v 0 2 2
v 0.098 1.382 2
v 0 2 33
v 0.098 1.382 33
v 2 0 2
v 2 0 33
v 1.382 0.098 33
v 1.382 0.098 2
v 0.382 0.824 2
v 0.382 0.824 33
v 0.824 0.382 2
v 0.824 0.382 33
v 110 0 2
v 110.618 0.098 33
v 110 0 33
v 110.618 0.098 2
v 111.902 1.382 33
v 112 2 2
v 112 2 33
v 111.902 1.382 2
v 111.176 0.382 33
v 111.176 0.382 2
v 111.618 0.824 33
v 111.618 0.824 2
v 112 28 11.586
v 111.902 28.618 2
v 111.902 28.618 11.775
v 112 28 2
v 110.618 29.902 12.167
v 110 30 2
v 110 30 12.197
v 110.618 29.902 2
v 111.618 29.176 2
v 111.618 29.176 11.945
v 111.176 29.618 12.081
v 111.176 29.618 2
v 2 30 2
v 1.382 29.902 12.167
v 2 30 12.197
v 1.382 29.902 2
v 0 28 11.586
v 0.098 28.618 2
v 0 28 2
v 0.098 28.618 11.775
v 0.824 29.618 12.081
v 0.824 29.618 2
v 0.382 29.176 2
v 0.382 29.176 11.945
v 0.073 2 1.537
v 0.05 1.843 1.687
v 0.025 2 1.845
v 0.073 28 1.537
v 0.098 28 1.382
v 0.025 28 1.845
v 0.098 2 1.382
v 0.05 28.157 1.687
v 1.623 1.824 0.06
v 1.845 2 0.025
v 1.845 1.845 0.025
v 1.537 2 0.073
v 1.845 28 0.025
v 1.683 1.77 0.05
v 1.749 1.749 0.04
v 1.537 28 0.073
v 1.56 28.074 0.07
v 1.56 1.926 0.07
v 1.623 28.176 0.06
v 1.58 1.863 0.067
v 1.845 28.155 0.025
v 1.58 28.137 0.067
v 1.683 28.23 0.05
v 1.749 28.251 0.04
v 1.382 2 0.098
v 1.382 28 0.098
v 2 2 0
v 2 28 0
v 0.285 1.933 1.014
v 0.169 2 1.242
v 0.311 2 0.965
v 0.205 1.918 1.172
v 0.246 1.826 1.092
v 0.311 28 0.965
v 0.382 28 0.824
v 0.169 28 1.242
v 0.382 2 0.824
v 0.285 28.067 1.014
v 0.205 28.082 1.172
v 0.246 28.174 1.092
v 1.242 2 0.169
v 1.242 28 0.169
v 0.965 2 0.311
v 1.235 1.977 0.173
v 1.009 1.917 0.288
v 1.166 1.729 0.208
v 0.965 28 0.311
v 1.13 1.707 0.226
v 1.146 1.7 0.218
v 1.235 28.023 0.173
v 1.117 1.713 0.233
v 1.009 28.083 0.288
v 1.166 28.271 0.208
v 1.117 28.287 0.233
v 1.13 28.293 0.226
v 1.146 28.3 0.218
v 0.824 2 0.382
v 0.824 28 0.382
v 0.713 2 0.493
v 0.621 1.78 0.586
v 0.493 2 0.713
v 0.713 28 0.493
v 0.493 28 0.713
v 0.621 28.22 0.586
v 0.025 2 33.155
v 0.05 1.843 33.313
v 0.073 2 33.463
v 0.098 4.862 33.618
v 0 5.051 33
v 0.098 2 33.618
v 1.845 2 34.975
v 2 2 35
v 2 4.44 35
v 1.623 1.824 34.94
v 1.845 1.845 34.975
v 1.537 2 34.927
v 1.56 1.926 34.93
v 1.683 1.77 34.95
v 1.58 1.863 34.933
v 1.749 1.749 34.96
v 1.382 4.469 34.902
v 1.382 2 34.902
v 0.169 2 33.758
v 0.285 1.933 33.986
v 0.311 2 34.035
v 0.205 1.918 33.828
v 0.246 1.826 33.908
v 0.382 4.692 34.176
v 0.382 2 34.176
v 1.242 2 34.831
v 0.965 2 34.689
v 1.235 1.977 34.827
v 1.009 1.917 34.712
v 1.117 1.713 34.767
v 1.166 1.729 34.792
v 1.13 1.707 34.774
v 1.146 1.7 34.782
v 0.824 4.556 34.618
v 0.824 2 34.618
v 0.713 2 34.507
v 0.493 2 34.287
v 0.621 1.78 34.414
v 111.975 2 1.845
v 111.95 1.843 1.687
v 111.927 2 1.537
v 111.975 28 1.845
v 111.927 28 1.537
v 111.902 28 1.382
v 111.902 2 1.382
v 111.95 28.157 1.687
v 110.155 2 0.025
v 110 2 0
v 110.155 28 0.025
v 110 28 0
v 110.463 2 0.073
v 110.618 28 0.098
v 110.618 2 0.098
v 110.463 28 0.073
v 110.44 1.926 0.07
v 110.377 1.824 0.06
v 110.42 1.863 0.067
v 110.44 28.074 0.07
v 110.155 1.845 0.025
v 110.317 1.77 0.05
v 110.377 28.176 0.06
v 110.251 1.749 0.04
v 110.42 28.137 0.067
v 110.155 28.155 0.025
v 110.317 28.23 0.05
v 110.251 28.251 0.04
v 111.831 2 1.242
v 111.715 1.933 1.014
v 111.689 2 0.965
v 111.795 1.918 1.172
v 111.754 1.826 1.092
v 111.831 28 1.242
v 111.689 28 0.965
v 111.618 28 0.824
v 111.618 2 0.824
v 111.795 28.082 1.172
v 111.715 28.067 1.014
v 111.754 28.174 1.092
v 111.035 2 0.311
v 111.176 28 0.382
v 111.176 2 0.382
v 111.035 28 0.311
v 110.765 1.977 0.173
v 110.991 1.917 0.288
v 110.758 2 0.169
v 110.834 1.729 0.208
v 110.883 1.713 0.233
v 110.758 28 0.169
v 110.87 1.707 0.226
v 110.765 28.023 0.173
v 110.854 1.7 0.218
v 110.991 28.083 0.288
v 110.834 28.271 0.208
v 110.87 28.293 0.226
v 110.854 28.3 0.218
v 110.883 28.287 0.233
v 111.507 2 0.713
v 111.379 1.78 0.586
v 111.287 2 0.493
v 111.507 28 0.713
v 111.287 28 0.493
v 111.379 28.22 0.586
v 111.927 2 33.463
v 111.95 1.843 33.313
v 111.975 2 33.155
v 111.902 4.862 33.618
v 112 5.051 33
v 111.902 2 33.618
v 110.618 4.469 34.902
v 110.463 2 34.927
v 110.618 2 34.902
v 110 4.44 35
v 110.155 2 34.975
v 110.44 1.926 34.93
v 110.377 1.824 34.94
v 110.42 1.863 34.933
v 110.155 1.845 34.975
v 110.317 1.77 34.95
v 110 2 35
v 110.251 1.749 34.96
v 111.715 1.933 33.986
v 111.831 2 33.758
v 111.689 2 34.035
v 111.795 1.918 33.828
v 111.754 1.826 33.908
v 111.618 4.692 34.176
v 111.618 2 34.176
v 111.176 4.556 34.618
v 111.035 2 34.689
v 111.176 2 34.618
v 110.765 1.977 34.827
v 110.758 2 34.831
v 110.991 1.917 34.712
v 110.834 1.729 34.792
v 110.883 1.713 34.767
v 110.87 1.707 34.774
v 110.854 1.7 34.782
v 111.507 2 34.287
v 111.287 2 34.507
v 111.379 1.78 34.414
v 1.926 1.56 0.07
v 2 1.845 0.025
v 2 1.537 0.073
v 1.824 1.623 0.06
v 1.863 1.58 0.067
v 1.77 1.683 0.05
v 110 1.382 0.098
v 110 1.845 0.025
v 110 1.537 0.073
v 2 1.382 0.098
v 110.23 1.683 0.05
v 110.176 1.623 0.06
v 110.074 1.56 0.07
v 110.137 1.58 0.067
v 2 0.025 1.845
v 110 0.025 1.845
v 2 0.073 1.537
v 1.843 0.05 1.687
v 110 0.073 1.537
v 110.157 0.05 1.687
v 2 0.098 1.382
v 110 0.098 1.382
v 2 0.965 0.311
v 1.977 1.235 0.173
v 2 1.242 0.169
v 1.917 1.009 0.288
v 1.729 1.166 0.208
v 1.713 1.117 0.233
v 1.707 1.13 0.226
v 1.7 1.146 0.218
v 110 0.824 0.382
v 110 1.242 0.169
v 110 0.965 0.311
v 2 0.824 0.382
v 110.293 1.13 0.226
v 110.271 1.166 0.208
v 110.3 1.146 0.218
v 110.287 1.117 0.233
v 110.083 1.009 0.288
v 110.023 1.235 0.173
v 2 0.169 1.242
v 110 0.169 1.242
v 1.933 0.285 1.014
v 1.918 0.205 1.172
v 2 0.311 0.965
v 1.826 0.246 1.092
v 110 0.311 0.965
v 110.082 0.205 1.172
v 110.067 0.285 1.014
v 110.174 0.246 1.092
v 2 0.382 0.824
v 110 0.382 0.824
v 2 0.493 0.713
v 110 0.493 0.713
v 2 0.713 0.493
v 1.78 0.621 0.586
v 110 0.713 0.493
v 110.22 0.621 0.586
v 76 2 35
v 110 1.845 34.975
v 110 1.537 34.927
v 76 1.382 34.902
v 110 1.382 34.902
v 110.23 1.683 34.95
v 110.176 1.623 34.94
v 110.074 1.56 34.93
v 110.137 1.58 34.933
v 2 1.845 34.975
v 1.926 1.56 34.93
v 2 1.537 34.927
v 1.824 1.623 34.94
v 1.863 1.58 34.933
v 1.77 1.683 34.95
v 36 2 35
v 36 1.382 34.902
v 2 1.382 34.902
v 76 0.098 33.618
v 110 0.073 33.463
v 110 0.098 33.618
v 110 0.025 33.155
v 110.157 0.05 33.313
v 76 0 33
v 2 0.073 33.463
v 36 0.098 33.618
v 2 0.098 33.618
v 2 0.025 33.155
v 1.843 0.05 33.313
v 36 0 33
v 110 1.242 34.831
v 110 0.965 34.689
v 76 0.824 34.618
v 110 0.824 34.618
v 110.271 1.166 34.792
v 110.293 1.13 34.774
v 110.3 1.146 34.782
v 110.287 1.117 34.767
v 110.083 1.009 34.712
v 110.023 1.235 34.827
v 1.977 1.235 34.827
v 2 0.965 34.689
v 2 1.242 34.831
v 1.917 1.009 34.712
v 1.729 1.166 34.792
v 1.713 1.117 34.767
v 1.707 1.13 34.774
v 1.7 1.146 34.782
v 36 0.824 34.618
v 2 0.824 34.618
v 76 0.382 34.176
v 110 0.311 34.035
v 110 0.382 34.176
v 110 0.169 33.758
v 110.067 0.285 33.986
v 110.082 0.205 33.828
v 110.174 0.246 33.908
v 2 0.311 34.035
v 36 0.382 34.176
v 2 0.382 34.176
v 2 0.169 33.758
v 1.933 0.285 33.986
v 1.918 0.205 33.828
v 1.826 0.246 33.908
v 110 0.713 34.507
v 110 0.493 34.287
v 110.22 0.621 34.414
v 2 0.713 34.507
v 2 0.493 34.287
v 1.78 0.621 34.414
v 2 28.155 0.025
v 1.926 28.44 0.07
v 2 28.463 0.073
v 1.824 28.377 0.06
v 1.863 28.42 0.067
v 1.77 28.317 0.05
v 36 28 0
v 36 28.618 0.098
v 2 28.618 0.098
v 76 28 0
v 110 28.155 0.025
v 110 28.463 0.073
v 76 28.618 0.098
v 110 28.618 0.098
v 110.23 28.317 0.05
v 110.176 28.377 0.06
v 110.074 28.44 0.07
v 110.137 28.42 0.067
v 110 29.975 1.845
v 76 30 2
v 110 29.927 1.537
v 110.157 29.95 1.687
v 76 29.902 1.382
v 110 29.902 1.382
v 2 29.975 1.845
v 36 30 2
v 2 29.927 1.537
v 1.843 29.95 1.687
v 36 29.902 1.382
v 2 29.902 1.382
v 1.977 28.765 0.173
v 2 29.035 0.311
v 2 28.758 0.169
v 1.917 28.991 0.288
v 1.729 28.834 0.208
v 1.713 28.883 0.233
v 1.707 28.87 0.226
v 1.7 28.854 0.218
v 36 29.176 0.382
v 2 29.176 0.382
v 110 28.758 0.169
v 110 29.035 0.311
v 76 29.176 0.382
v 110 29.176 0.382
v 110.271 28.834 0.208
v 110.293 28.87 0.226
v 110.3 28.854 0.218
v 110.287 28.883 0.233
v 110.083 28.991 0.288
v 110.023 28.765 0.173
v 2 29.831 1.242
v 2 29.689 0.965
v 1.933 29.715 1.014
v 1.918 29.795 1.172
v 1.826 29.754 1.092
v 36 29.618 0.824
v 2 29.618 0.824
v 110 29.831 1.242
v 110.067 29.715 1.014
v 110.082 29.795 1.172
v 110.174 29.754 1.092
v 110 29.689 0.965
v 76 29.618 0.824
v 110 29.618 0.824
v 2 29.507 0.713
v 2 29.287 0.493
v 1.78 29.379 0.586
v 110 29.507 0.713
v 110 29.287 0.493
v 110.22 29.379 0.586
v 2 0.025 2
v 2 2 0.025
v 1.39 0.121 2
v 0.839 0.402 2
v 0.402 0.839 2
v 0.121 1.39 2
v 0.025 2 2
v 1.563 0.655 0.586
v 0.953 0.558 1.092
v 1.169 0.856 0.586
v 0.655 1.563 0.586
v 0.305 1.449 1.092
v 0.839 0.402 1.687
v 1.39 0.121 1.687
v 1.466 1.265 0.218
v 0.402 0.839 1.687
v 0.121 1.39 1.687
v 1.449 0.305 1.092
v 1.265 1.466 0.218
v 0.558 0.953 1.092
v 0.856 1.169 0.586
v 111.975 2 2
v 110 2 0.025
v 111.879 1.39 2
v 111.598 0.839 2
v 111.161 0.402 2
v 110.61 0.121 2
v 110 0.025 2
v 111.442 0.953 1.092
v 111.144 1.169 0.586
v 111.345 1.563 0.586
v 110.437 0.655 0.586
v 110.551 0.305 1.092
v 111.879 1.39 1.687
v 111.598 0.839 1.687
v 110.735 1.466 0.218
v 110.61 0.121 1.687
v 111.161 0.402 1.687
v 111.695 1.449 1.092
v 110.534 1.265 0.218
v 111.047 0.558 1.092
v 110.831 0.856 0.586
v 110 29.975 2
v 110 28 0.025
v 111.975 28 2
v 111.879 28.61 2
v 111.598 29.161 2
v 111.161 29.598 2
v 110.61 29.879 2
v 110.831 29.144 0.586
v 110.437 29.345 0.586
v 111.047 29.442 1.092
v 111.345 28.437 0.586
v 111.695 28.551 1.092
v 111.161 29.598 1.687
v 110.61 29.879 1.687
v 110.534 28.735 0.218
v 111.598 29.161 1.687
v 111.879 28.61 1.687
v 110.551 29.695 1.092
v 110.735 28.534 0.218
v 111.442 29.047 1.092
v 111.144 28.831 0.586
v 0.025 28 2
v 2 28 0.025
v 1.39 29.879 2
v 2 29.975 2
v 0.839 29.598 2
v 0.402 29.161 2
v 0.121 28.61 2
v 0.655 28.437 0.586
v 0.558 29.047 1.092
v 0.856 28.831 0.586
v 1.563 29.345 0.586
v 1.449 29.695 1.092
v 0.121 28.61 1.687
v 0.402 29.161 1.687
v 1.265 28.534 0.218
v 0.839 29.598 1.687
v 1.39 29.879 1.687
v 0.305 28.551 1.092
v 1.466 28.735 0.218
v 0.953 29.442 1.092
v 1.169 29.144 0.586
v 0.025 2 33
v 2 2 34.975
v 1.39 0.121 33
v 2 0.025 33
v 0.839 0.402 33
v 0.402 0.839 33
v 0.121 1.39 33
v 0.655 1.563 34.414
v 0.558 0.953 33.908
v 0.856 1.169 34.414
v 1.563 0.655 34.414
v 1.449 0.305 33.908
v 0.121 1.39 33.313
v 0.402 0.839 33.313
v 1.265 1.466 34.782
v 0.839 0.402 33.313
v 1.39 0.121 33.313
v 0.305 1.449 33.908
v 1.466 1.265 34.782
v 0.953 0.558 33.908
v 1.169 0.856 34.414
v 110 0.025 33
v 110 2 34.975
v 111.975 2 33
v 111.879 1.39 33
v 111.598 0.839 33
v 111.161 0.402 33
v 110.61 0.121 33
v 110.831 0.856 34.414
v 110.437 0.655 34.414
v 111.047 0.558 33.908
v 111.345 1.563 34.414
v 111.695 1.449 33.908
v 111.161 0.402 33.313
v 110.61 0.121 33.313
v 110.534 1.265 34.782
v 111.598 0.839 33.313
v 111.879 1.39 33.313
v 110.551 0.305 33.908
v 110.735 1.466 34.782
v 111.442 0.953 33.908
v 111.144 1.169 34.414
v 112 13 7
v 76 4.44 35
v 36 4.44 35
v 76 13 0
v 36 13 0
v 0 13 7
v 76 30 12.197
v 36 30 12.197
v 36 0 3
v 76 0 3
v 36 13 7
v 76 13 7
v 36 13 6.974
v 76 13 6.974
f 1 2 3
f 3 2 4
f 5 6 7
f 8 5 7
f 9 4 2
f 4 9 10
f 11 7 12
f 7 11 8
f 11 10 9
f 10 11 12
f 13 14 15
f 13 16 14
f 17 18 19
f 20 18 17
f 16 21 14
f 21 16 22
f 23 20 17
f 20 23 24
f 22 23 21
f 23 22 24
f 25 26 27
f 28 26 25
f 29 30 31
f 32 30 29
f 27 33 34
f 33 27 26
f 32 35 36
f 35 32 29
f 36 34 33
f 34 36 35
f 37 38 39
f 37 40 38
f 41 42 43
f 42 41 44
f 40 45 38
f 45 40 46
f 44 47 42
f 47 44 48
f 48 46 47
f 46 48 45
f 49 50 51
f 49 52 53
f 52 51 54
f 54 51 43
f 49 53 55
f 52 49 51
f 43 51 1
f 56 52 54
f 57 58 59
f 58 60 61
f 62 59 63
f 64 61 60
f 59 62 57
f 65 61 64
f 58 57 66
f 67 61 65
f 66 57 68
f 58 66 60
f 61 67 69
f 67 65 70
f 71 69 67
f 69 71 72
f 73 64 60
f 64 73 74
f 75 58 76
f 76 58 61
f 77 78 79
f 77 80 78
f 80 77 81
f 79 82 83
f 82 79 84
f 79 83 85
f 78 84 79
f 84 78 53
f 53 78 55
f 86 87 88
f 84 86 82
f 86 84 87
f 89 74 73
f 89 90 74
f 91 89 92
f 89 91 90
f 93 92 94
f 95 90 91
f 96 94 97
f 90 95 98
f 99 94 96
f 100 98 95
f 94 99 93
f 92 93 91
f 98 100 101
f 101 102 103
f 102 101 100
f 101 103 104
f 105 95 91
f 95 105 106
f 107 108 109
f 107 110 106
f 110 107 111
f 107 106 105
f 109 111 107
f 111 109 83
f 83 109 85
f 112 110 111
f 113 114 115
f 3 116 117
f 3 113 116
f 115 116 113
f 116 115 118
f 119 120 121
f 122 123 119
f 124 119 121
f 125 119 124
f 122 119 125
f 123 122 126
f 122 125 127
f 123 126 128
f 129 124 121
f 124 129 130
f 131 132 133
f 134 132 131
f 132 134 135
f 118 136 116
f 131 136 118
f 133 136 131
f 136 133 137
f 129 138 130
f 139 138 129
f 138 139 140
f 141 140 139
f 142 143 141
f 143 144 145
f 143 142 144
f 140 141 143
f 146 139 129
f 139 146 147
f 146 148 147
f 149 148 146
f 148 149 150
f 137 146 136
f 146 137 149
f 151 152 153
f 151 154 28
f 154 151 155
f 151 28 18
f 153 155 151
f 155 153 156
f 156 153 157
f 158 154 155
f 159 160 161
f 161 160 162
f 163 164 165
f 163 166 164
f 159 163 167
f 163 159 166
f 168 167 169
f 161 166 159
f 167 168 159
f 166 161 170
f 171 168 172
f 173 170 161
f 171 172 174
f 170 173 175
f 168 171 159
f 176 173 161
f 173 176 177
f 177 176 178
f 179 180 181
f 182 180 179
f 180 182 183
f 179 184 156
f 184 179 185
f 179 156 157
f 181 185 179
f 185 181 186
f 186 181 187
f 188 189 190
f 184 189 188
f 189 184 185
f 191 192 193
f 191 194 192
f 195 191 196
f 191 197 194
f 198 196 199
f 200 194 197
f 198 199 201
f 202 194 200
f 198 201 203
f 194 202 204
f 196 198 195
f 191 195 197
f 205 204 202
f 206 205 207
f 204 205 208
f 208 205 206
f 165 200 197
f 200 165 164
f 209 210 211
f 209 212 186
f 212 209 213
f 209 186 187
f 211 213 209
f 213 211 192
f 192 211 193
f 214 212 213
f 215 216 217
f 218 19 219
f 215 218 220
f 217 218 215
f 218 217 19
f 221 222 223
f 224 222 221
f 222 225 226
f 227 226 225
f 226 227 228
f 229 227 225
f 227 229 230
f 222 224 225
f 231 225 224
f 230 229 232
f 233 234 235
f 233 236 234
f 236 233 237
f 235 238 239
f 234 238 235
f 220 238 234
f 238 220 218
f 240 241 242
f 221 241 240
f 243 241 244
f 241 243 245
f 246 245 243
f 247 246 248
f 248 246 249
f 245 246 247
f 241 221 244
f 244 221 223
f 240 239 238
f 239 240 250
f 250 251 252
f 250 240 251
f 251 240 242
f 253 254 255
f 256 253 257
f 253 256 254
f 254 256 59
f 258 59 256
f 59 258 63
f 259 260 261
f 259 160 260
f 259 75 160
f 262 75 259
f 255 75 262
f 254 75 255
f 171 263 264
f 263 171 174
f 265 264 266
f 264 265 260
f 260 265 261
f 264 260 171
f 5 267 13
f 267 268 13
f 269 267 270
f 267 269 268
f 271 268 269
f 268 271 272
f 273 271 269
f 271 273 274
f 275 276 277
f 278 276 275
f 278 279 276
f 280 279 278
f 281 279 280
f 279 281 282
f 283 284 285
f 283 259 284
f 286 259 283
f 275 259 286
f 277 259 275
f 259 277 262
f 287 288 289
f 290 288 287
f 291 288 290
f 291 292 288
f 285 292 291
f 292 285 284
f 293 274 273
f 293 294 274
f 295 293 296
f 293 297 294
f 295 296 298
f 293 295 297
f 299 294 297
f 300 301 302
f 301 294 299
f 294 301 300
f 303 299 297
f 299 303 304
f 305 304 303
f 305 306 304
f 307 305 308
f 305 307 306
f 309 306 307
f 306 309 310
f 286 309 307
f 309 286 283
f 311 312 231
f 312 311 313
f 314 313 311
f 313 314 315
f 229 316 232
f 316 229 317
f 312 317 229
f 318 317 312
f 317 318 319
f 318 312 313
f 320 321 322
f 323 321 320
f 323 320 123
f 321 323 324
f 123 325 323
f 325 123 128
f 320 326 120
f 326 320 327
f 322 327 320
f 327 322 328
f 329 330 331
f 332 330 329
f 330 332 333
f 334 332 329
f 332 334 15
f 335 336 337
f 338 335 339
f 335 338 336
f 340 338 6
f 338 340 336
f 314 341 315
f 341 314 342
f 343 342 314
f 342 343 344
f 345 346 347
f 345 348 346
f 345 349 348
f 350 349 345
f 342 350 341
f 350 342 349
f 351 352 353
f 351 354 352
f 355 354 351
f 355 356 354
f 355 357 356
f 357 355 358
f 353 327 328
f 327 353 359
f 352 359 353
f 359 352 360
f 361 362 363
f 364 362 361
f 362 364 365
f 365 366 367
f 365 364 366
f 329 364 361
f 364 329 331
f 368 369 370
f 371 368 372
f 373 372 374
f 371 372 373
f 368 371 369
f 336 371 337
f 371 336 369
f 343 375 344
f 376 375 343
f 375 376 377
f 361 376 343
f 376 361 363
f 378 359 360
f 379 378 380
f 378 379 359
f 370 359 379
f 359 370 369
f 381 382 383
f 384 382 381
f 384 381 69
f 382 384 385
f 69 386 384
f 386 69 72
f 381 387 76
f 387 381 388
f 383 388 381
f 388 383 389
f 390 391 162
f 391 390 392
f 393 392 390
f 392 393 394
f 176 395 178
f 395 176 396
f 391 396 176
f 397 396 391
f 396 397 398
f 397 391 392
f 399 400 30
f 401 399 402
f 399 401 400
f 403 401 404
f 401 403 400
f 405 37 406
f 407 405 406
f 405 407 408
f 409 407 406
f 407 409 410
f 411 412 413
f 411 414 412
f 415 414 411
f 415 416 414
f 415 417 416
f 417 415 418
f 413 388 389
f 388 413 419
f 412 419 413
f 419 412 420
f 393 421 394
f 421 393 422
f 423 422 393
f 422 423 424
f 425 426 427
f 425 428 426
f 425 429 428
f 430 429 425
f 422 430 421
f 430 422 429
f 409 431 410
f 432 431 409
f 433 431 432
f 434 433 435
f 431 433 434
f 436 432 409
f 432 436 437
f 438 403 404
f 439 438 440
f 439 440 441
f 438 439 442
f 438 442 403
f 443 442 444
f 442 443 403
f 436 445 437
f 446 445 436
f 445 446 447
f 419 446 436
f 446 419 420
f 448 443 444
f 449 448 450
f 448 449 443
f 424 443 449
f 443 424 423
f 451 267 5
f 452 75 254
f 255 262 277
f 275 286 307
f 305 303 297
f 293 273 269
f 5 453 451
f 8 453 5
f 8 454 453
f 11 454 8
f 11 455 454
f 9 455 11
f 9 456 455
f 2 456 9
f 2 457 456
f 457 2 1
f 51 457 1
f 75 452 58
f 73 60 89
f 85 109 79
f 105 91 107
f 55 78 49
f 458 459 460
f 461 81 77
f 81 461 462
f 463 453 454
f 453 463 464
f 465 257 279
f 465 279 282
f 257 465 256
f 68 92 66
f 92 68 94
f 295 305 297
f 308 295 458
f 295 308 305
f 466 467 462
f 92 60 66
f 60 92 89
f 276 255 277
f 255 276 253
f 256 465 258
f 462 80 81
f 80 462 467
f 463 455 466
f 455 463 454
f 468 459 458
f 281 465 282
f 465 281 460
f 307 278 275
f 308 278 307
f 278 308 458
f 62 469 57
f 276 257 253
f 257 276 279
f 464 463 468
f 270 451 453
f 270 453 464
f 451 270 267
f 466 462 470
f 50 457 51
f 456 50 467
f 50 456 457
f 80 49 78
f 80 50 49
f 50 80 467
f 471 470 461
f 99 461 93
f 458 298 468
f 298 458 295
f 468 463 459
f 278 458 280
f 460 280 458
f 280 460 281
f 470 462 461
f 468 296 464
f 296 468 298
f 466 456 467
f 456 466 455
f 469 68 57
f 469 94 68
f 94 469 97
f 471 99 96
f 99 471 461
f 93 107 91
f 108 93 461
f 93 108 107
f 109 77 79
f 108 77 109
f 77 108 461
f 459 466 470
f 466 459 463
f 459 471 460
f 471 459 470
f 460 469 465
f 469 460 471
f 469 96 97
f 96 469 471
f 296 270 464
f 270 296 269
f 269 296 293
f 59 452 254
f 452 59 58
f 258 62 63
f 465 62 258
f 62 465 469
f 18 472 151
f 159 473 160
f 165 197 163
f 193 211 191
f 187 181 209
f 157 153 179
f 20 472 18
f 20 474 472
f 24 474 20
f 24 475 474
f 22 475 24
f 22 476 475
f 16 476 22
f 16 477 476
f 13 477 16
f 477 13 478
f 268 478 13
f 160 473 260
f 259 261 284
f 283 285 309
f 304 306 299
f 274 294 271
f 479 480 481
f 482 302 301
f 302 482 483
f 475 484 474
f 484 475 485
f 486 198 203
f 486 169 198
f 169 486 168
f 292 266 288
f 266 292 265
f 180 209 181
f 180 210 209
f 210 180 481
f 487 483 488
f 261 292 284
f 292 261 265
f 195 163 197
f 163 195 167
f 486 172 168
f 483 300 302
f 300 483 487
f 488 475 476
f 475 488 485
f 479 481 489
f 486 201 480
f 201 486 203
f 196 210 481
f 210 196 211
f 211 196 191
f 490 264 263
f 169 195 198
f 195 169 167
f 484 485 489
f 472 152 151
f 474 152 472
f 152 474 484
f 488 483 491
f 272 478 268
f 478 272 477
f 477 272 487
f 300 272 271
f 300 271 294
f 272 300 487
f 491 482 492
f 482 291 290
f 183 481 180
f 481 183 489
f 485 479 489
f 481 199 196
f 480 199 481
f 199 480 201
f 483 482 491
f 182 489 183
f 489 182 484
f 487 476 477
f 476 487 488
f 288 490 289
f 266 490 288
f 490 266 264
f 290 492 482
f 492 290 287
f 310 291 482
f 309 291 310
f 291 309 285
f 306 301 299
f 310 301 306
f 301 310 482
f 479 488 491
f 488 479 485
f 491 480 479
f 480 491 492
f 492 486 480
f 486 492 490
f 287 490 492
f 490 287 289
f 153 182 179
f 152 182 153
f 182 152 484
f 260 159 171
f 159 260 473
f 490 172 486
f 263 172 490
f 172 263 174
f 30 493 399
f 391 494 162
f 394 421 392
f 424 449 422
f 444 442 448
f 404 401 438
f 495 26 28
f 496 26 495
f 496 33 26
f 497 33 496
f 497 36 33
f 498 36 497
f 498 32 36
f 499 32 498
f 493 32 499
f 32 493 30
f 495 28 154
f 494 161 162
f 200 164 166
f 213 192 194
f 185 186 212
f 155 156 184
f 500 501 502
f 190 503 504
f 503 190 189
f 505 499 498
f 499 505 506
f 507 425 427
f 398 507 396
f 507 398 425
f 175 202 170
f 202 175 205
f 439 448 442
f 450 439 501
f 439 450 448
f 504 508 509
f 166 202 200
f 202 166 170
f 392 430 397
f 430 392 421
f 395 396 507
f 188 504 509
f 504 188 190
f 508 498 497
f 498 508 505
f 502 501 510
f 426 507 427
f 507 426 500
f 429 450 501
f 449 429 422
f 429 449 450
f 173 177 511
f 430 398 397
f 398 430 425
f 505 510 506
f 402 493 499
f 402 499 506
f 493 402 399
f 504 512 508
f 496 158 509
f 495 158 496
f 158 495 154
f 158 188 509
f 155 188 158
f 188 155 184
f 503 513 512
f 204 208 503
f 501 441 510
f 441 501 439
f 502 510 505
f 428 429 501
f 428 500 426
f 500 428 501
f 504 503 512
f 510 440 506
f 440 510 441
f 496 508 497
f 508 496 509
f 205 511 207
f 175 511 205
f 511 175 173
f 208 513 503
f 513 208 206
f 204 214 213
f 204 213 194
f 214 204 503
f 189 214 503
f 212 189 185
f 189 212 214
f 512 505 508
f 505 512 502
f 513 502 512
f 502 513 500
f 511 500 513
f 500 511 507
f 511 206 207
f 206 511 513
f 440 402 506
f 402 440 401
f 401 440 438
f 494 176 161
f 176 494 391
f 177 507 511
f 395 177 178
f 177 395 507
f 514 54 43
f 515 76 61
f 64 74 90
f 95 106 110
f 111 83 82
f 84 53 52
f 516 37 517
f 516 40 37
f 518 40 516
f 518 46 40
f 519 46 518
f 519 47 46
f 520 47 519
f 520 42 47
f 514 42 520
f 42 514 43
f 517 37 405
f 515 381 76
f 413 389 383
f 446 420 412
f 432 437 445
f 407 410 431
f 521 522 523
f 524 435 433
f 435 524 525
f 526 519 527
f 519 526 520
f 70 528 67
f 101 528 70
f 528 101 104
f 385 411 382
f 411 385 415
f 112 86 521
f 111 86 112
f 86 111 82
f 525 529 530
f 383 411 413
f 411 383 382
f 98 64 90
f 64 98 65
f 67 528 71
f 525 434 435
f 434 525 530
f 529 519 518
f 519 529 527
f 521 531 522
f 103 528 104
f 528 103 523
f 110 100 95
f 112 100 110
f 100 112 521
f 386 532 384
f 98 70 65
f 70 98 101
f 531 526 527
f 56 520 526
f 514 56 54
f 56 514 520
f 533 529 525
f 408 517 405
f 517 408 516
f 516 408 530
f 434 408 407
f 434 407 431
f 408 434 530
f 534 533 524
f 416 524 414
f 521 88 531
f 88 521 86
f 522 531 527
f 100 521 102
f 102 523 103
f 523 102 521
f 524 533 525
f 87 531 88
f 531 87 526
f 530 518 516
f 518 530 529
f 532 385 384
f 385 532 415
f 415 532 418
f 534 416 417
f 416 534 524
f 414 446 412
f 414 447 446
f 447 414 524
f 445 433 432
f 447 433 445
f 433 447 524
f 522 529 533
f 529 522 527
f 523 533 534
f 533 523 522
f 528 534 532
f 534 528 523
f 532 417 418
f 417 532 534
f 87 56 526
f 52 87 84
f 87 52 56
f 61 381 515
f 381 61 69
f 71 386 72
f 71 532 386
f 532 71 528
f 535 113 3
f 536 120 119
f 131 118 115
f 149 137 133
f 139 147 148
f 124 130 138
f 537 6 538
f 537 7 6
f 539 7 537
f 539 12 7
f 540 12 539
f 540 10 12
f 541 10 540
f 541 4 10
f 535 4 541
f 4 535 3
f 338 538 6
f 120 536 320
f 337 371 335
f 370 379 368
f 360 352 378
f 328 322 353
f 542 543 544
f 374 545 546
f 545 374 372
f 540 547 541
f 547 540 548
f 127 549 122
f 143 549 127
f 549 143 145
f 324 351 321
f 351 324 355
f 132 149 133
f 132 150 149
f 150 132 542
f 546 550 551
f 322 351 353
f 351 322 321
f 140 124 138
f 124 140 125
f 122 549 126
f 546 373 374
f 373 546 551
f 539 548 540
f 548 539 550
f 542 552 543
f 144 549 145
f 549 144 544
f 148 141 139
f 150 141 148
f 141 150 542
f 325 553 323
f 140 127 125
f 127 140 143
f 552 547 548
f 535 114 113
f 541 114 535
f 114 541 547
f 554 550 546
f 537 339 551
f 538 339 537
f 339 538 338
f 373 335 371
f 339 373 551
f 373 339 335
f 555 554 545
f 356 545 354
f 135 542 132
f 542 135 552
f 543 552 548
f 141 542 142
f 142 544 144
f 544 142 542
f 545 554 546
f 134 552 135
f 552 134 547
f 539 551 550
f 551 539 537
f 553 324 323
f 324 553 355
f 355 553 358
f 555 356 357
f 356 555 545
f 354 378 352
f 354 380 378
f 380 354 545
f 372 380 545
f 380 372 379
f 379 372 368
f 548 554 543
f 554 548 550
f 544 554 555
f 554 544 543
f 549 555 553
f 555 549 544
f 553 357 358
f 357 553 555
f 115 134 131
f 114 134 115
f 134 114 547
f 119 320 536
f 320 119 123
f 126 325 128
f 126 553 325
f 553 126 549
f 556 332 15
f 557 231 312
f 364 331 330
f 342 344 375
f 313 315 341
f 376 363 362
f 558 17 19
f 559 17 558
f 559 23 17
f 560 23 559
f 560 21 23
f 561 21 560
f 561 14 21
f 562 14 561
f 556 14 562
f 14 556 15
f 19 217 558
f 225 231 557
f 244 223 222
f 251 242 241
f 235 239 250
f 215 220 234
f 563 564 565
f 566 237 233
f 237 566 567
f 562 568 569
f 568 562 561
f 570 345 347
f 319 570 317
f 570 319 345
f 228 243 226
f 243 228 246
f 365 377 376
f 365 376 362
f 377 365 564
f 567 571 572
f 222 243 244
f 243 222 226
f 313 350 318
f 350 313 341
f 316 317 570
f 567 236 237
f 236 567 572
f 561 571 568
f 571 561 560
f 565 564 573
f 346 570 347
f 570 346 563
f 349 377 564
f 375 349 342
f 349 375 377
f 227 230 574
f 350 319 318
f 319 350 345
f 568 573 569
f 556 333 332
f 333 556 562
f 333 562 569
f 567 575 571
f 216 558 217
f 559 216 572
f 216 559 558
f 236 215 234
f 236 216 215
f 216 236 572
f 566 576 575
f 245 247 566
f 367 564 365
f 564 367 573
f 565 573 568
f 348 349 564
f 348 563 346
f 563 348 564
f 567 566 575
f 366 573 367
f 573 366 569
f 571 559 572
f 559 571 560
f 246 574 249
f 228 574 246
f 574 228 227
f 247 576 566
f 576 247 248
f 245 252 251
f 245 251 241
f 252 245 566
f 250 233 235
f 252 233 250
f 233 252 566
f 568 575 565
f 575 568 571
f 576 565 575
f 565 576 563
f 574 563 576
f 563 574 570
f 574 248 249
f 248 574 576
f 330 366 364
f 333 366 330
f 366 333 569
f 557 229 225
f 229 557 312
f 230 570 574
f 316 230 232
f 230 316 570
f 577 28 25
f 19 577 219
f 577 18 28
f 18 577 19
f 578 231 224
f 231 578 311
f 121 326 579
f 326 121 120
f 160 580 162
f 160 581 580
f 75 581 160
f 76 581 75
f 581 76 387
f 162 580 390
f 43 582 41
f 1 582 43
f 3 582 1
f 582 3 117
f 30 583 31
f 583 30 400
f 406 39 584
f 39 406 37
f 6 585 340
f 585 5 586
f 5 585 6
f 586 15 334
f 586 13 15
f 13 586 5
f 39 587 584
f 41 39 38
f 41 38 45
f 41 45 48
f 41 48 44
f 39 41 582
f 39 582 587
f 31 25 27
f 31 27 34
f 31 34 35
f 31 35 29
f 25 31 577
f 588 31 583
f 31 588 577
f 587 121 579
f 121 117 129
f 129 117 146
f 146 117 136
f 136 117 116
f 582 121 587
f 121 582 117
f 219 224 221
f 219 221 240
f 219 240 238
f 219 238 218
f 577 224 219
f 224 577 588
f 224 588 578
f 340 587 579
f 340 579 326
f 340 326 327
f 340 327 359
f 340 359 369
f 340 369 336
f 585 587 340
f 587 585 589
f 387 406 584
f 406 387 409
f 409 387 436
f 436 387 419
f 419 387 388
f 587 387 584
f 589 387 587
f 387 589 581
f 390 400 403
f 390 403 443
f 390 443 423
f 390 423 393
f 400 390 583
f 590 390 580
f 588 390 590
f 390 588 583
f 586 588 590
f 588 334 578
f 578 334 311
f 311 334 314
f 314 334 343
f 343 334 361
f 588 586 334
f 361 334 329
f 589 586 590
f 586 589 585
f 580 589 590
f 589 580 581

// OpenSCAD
// Cube with rounded edges

el = 1e-2;

module rcube_rcorner ( r, fn )
{
   difference() {
      translate ( -el * [ 1, 1, 1 ] ) cube( r + el );
      translate ( [ r, r, r ] ) sphere( r, $fn = fn );
   }
}

module rcube_redge ( r, l, fn )
{
   difference() {
      translate ( -2 * el * [ 1, 1, 1 ] ) cube( [ r + 2 * el, r + 2 * el, l + 4 * el ] );
      translate ( [ r, r, -el ] ) cylinder( r = r, h = l + 2 * el, $fn = fn );
   }
}

module rcube( size = 1, center = false, r = 0, $fn = 20 )
{
        sz = len( size ) == undef ? [ size, size, size ] : size;
        displacement = center == true ? -size / 2: [ 0, 0, 0 ];

        translate( displacement ) {
                difference() {
                        cube( size = sz );
                        union (){
                                // Round the edges:

                                rcube_redge( r, sz[2], fn = $fn );
                                translate( [ sz[0], 0, 0 ] ) rotate( 90, [ 0, 0, 1 ] ) rcube_redge( r, sz[2], fn = $fn );
                                translate( [ sz[0], sz[1], 0 ] ) rotate( 180, [ 0, 0, 1 ] ) rcube_redge( r, sz[2], fn = $fn );
                                translate( [ 0, sz[1], 0 ] ) rotate( 270, [ 0, 0, 1 ] ) rcube_redge( r, sz[2], fn = $fn );

                                translate( [ 0, sz[1], 0 ] ) rotate ( 90, [ 1, 0, 0 ] ) rcube_redge( r, sz[1], fn = $fn );
                                translate( [ 0, 0, sz[2] ] ) rotate ( -90, [ 1, 0, 0 ] ) rcube_redge( r, sz[1], fn = $fn );
                                translate( [ sz[0], 0, 0 ] ) rotate ( 180, [ 0, 1, 1 ] ) rcube_redge( r, sz[1], fn = $fn );
                                translate( [ sz[0], sz[1], sz[2] ] ) rotate ( 180, [ 0, 1, -1 ] ) rcube_redge( r, sz[1], fn = $fn );

                                translate( [ sz[0], 0, 0 ] ) rotate( -90, [ 0, 1, 0 ] )  rcube_redge( r, sz[0], fn = $fn );
                                translate( [ 0, 0, sz[2] ] ) rotate( 90, [ 0, 1, 0 ] )  rcube_redge( r, sz[0], fn = $fn );
                                translate( [ 0, sz[1], 0 ] ) rotate( 180, [ 1, 0, 1 ] )  rcube_redge( r, sz[0], fn = $fn );
                                translate( [ sz[0], sz[1], sz[2] ] ) rotate( 180, [ 1, 0, -1 ] )  rcube_redge( r, sz[0], fn = $fn );

                                // Round the corners:
                                rcube_rcorner( r, fn = $fn );
                                translate( [ sz[0], 0, 0 ] ) rotate( 90, [ 0, 0, 1 ] ) rcube_rcorner( r, fn = $fn );
                                translate( [ sz[0], sz[1], 0 ] ) rotate( 180, [ 0, 0, 1 ] ) rcube_rcorner( r, fn = $fn );
                                translate( [ 0, sz[1], 0 ] ) rotate( 270, [ 0, 0, 1 ] ) rcube_rcorner( r, fn = $fn );

                                translate( [ 0, 0, sz[2] ] ) rotate( 90, [ 0, 0, 1 ] ) rotate( 180, [ 1, 0, 0 ] ) rcube_rcorner( r, fn = $fn );
                                translate( [ sz[0], 0, sz[2] ] ) rotate( 180, [ 0, 0, 1 ] ) rotate( 180, [ 1, 0, 0 ] ) rcube_rcorner( r, fn = $fn );
                                translate( [ sz[0], sz[1], sz[2] ] ) rotate( 270, [ 0, 0, 1 ] ) rotate( 180, [ 1, 0, 0 ] ) rcube_rcorner( r, fn = $fn );
                                translate( [ 0, sz[1], sz[2] ] ) rotate( 180, [ 1, 0, 0 ] ) rcube_rcorner( r, fn = $fn );

                        }
                }
        }
}

render( convexity = 10 ) {
    
    difference(){
        rcube( [ 112, 30, 35 ], r = 2 );
        
        translate( [ 0, 13, 7 ] )
            rotate( 17, [ 1, 0, 0 ] )
                translate( [ -1, 0, 0 ] )
                    cube( [ 114, 35, 35 ] );
        translate( [ 0, 0, 3 ] )
            rotate( 17, [ 1, 0, 0 ] )
                translate( [ ( 112 - 40 ) / 2, 0, 0 ] )
                    cube( [ 40, 35, 35 ] );
        translate( [ ( 112 - 40 ) / 2, 13, 0 ] )
            cube( [ 40, 20, 50 ] );
    }
}
